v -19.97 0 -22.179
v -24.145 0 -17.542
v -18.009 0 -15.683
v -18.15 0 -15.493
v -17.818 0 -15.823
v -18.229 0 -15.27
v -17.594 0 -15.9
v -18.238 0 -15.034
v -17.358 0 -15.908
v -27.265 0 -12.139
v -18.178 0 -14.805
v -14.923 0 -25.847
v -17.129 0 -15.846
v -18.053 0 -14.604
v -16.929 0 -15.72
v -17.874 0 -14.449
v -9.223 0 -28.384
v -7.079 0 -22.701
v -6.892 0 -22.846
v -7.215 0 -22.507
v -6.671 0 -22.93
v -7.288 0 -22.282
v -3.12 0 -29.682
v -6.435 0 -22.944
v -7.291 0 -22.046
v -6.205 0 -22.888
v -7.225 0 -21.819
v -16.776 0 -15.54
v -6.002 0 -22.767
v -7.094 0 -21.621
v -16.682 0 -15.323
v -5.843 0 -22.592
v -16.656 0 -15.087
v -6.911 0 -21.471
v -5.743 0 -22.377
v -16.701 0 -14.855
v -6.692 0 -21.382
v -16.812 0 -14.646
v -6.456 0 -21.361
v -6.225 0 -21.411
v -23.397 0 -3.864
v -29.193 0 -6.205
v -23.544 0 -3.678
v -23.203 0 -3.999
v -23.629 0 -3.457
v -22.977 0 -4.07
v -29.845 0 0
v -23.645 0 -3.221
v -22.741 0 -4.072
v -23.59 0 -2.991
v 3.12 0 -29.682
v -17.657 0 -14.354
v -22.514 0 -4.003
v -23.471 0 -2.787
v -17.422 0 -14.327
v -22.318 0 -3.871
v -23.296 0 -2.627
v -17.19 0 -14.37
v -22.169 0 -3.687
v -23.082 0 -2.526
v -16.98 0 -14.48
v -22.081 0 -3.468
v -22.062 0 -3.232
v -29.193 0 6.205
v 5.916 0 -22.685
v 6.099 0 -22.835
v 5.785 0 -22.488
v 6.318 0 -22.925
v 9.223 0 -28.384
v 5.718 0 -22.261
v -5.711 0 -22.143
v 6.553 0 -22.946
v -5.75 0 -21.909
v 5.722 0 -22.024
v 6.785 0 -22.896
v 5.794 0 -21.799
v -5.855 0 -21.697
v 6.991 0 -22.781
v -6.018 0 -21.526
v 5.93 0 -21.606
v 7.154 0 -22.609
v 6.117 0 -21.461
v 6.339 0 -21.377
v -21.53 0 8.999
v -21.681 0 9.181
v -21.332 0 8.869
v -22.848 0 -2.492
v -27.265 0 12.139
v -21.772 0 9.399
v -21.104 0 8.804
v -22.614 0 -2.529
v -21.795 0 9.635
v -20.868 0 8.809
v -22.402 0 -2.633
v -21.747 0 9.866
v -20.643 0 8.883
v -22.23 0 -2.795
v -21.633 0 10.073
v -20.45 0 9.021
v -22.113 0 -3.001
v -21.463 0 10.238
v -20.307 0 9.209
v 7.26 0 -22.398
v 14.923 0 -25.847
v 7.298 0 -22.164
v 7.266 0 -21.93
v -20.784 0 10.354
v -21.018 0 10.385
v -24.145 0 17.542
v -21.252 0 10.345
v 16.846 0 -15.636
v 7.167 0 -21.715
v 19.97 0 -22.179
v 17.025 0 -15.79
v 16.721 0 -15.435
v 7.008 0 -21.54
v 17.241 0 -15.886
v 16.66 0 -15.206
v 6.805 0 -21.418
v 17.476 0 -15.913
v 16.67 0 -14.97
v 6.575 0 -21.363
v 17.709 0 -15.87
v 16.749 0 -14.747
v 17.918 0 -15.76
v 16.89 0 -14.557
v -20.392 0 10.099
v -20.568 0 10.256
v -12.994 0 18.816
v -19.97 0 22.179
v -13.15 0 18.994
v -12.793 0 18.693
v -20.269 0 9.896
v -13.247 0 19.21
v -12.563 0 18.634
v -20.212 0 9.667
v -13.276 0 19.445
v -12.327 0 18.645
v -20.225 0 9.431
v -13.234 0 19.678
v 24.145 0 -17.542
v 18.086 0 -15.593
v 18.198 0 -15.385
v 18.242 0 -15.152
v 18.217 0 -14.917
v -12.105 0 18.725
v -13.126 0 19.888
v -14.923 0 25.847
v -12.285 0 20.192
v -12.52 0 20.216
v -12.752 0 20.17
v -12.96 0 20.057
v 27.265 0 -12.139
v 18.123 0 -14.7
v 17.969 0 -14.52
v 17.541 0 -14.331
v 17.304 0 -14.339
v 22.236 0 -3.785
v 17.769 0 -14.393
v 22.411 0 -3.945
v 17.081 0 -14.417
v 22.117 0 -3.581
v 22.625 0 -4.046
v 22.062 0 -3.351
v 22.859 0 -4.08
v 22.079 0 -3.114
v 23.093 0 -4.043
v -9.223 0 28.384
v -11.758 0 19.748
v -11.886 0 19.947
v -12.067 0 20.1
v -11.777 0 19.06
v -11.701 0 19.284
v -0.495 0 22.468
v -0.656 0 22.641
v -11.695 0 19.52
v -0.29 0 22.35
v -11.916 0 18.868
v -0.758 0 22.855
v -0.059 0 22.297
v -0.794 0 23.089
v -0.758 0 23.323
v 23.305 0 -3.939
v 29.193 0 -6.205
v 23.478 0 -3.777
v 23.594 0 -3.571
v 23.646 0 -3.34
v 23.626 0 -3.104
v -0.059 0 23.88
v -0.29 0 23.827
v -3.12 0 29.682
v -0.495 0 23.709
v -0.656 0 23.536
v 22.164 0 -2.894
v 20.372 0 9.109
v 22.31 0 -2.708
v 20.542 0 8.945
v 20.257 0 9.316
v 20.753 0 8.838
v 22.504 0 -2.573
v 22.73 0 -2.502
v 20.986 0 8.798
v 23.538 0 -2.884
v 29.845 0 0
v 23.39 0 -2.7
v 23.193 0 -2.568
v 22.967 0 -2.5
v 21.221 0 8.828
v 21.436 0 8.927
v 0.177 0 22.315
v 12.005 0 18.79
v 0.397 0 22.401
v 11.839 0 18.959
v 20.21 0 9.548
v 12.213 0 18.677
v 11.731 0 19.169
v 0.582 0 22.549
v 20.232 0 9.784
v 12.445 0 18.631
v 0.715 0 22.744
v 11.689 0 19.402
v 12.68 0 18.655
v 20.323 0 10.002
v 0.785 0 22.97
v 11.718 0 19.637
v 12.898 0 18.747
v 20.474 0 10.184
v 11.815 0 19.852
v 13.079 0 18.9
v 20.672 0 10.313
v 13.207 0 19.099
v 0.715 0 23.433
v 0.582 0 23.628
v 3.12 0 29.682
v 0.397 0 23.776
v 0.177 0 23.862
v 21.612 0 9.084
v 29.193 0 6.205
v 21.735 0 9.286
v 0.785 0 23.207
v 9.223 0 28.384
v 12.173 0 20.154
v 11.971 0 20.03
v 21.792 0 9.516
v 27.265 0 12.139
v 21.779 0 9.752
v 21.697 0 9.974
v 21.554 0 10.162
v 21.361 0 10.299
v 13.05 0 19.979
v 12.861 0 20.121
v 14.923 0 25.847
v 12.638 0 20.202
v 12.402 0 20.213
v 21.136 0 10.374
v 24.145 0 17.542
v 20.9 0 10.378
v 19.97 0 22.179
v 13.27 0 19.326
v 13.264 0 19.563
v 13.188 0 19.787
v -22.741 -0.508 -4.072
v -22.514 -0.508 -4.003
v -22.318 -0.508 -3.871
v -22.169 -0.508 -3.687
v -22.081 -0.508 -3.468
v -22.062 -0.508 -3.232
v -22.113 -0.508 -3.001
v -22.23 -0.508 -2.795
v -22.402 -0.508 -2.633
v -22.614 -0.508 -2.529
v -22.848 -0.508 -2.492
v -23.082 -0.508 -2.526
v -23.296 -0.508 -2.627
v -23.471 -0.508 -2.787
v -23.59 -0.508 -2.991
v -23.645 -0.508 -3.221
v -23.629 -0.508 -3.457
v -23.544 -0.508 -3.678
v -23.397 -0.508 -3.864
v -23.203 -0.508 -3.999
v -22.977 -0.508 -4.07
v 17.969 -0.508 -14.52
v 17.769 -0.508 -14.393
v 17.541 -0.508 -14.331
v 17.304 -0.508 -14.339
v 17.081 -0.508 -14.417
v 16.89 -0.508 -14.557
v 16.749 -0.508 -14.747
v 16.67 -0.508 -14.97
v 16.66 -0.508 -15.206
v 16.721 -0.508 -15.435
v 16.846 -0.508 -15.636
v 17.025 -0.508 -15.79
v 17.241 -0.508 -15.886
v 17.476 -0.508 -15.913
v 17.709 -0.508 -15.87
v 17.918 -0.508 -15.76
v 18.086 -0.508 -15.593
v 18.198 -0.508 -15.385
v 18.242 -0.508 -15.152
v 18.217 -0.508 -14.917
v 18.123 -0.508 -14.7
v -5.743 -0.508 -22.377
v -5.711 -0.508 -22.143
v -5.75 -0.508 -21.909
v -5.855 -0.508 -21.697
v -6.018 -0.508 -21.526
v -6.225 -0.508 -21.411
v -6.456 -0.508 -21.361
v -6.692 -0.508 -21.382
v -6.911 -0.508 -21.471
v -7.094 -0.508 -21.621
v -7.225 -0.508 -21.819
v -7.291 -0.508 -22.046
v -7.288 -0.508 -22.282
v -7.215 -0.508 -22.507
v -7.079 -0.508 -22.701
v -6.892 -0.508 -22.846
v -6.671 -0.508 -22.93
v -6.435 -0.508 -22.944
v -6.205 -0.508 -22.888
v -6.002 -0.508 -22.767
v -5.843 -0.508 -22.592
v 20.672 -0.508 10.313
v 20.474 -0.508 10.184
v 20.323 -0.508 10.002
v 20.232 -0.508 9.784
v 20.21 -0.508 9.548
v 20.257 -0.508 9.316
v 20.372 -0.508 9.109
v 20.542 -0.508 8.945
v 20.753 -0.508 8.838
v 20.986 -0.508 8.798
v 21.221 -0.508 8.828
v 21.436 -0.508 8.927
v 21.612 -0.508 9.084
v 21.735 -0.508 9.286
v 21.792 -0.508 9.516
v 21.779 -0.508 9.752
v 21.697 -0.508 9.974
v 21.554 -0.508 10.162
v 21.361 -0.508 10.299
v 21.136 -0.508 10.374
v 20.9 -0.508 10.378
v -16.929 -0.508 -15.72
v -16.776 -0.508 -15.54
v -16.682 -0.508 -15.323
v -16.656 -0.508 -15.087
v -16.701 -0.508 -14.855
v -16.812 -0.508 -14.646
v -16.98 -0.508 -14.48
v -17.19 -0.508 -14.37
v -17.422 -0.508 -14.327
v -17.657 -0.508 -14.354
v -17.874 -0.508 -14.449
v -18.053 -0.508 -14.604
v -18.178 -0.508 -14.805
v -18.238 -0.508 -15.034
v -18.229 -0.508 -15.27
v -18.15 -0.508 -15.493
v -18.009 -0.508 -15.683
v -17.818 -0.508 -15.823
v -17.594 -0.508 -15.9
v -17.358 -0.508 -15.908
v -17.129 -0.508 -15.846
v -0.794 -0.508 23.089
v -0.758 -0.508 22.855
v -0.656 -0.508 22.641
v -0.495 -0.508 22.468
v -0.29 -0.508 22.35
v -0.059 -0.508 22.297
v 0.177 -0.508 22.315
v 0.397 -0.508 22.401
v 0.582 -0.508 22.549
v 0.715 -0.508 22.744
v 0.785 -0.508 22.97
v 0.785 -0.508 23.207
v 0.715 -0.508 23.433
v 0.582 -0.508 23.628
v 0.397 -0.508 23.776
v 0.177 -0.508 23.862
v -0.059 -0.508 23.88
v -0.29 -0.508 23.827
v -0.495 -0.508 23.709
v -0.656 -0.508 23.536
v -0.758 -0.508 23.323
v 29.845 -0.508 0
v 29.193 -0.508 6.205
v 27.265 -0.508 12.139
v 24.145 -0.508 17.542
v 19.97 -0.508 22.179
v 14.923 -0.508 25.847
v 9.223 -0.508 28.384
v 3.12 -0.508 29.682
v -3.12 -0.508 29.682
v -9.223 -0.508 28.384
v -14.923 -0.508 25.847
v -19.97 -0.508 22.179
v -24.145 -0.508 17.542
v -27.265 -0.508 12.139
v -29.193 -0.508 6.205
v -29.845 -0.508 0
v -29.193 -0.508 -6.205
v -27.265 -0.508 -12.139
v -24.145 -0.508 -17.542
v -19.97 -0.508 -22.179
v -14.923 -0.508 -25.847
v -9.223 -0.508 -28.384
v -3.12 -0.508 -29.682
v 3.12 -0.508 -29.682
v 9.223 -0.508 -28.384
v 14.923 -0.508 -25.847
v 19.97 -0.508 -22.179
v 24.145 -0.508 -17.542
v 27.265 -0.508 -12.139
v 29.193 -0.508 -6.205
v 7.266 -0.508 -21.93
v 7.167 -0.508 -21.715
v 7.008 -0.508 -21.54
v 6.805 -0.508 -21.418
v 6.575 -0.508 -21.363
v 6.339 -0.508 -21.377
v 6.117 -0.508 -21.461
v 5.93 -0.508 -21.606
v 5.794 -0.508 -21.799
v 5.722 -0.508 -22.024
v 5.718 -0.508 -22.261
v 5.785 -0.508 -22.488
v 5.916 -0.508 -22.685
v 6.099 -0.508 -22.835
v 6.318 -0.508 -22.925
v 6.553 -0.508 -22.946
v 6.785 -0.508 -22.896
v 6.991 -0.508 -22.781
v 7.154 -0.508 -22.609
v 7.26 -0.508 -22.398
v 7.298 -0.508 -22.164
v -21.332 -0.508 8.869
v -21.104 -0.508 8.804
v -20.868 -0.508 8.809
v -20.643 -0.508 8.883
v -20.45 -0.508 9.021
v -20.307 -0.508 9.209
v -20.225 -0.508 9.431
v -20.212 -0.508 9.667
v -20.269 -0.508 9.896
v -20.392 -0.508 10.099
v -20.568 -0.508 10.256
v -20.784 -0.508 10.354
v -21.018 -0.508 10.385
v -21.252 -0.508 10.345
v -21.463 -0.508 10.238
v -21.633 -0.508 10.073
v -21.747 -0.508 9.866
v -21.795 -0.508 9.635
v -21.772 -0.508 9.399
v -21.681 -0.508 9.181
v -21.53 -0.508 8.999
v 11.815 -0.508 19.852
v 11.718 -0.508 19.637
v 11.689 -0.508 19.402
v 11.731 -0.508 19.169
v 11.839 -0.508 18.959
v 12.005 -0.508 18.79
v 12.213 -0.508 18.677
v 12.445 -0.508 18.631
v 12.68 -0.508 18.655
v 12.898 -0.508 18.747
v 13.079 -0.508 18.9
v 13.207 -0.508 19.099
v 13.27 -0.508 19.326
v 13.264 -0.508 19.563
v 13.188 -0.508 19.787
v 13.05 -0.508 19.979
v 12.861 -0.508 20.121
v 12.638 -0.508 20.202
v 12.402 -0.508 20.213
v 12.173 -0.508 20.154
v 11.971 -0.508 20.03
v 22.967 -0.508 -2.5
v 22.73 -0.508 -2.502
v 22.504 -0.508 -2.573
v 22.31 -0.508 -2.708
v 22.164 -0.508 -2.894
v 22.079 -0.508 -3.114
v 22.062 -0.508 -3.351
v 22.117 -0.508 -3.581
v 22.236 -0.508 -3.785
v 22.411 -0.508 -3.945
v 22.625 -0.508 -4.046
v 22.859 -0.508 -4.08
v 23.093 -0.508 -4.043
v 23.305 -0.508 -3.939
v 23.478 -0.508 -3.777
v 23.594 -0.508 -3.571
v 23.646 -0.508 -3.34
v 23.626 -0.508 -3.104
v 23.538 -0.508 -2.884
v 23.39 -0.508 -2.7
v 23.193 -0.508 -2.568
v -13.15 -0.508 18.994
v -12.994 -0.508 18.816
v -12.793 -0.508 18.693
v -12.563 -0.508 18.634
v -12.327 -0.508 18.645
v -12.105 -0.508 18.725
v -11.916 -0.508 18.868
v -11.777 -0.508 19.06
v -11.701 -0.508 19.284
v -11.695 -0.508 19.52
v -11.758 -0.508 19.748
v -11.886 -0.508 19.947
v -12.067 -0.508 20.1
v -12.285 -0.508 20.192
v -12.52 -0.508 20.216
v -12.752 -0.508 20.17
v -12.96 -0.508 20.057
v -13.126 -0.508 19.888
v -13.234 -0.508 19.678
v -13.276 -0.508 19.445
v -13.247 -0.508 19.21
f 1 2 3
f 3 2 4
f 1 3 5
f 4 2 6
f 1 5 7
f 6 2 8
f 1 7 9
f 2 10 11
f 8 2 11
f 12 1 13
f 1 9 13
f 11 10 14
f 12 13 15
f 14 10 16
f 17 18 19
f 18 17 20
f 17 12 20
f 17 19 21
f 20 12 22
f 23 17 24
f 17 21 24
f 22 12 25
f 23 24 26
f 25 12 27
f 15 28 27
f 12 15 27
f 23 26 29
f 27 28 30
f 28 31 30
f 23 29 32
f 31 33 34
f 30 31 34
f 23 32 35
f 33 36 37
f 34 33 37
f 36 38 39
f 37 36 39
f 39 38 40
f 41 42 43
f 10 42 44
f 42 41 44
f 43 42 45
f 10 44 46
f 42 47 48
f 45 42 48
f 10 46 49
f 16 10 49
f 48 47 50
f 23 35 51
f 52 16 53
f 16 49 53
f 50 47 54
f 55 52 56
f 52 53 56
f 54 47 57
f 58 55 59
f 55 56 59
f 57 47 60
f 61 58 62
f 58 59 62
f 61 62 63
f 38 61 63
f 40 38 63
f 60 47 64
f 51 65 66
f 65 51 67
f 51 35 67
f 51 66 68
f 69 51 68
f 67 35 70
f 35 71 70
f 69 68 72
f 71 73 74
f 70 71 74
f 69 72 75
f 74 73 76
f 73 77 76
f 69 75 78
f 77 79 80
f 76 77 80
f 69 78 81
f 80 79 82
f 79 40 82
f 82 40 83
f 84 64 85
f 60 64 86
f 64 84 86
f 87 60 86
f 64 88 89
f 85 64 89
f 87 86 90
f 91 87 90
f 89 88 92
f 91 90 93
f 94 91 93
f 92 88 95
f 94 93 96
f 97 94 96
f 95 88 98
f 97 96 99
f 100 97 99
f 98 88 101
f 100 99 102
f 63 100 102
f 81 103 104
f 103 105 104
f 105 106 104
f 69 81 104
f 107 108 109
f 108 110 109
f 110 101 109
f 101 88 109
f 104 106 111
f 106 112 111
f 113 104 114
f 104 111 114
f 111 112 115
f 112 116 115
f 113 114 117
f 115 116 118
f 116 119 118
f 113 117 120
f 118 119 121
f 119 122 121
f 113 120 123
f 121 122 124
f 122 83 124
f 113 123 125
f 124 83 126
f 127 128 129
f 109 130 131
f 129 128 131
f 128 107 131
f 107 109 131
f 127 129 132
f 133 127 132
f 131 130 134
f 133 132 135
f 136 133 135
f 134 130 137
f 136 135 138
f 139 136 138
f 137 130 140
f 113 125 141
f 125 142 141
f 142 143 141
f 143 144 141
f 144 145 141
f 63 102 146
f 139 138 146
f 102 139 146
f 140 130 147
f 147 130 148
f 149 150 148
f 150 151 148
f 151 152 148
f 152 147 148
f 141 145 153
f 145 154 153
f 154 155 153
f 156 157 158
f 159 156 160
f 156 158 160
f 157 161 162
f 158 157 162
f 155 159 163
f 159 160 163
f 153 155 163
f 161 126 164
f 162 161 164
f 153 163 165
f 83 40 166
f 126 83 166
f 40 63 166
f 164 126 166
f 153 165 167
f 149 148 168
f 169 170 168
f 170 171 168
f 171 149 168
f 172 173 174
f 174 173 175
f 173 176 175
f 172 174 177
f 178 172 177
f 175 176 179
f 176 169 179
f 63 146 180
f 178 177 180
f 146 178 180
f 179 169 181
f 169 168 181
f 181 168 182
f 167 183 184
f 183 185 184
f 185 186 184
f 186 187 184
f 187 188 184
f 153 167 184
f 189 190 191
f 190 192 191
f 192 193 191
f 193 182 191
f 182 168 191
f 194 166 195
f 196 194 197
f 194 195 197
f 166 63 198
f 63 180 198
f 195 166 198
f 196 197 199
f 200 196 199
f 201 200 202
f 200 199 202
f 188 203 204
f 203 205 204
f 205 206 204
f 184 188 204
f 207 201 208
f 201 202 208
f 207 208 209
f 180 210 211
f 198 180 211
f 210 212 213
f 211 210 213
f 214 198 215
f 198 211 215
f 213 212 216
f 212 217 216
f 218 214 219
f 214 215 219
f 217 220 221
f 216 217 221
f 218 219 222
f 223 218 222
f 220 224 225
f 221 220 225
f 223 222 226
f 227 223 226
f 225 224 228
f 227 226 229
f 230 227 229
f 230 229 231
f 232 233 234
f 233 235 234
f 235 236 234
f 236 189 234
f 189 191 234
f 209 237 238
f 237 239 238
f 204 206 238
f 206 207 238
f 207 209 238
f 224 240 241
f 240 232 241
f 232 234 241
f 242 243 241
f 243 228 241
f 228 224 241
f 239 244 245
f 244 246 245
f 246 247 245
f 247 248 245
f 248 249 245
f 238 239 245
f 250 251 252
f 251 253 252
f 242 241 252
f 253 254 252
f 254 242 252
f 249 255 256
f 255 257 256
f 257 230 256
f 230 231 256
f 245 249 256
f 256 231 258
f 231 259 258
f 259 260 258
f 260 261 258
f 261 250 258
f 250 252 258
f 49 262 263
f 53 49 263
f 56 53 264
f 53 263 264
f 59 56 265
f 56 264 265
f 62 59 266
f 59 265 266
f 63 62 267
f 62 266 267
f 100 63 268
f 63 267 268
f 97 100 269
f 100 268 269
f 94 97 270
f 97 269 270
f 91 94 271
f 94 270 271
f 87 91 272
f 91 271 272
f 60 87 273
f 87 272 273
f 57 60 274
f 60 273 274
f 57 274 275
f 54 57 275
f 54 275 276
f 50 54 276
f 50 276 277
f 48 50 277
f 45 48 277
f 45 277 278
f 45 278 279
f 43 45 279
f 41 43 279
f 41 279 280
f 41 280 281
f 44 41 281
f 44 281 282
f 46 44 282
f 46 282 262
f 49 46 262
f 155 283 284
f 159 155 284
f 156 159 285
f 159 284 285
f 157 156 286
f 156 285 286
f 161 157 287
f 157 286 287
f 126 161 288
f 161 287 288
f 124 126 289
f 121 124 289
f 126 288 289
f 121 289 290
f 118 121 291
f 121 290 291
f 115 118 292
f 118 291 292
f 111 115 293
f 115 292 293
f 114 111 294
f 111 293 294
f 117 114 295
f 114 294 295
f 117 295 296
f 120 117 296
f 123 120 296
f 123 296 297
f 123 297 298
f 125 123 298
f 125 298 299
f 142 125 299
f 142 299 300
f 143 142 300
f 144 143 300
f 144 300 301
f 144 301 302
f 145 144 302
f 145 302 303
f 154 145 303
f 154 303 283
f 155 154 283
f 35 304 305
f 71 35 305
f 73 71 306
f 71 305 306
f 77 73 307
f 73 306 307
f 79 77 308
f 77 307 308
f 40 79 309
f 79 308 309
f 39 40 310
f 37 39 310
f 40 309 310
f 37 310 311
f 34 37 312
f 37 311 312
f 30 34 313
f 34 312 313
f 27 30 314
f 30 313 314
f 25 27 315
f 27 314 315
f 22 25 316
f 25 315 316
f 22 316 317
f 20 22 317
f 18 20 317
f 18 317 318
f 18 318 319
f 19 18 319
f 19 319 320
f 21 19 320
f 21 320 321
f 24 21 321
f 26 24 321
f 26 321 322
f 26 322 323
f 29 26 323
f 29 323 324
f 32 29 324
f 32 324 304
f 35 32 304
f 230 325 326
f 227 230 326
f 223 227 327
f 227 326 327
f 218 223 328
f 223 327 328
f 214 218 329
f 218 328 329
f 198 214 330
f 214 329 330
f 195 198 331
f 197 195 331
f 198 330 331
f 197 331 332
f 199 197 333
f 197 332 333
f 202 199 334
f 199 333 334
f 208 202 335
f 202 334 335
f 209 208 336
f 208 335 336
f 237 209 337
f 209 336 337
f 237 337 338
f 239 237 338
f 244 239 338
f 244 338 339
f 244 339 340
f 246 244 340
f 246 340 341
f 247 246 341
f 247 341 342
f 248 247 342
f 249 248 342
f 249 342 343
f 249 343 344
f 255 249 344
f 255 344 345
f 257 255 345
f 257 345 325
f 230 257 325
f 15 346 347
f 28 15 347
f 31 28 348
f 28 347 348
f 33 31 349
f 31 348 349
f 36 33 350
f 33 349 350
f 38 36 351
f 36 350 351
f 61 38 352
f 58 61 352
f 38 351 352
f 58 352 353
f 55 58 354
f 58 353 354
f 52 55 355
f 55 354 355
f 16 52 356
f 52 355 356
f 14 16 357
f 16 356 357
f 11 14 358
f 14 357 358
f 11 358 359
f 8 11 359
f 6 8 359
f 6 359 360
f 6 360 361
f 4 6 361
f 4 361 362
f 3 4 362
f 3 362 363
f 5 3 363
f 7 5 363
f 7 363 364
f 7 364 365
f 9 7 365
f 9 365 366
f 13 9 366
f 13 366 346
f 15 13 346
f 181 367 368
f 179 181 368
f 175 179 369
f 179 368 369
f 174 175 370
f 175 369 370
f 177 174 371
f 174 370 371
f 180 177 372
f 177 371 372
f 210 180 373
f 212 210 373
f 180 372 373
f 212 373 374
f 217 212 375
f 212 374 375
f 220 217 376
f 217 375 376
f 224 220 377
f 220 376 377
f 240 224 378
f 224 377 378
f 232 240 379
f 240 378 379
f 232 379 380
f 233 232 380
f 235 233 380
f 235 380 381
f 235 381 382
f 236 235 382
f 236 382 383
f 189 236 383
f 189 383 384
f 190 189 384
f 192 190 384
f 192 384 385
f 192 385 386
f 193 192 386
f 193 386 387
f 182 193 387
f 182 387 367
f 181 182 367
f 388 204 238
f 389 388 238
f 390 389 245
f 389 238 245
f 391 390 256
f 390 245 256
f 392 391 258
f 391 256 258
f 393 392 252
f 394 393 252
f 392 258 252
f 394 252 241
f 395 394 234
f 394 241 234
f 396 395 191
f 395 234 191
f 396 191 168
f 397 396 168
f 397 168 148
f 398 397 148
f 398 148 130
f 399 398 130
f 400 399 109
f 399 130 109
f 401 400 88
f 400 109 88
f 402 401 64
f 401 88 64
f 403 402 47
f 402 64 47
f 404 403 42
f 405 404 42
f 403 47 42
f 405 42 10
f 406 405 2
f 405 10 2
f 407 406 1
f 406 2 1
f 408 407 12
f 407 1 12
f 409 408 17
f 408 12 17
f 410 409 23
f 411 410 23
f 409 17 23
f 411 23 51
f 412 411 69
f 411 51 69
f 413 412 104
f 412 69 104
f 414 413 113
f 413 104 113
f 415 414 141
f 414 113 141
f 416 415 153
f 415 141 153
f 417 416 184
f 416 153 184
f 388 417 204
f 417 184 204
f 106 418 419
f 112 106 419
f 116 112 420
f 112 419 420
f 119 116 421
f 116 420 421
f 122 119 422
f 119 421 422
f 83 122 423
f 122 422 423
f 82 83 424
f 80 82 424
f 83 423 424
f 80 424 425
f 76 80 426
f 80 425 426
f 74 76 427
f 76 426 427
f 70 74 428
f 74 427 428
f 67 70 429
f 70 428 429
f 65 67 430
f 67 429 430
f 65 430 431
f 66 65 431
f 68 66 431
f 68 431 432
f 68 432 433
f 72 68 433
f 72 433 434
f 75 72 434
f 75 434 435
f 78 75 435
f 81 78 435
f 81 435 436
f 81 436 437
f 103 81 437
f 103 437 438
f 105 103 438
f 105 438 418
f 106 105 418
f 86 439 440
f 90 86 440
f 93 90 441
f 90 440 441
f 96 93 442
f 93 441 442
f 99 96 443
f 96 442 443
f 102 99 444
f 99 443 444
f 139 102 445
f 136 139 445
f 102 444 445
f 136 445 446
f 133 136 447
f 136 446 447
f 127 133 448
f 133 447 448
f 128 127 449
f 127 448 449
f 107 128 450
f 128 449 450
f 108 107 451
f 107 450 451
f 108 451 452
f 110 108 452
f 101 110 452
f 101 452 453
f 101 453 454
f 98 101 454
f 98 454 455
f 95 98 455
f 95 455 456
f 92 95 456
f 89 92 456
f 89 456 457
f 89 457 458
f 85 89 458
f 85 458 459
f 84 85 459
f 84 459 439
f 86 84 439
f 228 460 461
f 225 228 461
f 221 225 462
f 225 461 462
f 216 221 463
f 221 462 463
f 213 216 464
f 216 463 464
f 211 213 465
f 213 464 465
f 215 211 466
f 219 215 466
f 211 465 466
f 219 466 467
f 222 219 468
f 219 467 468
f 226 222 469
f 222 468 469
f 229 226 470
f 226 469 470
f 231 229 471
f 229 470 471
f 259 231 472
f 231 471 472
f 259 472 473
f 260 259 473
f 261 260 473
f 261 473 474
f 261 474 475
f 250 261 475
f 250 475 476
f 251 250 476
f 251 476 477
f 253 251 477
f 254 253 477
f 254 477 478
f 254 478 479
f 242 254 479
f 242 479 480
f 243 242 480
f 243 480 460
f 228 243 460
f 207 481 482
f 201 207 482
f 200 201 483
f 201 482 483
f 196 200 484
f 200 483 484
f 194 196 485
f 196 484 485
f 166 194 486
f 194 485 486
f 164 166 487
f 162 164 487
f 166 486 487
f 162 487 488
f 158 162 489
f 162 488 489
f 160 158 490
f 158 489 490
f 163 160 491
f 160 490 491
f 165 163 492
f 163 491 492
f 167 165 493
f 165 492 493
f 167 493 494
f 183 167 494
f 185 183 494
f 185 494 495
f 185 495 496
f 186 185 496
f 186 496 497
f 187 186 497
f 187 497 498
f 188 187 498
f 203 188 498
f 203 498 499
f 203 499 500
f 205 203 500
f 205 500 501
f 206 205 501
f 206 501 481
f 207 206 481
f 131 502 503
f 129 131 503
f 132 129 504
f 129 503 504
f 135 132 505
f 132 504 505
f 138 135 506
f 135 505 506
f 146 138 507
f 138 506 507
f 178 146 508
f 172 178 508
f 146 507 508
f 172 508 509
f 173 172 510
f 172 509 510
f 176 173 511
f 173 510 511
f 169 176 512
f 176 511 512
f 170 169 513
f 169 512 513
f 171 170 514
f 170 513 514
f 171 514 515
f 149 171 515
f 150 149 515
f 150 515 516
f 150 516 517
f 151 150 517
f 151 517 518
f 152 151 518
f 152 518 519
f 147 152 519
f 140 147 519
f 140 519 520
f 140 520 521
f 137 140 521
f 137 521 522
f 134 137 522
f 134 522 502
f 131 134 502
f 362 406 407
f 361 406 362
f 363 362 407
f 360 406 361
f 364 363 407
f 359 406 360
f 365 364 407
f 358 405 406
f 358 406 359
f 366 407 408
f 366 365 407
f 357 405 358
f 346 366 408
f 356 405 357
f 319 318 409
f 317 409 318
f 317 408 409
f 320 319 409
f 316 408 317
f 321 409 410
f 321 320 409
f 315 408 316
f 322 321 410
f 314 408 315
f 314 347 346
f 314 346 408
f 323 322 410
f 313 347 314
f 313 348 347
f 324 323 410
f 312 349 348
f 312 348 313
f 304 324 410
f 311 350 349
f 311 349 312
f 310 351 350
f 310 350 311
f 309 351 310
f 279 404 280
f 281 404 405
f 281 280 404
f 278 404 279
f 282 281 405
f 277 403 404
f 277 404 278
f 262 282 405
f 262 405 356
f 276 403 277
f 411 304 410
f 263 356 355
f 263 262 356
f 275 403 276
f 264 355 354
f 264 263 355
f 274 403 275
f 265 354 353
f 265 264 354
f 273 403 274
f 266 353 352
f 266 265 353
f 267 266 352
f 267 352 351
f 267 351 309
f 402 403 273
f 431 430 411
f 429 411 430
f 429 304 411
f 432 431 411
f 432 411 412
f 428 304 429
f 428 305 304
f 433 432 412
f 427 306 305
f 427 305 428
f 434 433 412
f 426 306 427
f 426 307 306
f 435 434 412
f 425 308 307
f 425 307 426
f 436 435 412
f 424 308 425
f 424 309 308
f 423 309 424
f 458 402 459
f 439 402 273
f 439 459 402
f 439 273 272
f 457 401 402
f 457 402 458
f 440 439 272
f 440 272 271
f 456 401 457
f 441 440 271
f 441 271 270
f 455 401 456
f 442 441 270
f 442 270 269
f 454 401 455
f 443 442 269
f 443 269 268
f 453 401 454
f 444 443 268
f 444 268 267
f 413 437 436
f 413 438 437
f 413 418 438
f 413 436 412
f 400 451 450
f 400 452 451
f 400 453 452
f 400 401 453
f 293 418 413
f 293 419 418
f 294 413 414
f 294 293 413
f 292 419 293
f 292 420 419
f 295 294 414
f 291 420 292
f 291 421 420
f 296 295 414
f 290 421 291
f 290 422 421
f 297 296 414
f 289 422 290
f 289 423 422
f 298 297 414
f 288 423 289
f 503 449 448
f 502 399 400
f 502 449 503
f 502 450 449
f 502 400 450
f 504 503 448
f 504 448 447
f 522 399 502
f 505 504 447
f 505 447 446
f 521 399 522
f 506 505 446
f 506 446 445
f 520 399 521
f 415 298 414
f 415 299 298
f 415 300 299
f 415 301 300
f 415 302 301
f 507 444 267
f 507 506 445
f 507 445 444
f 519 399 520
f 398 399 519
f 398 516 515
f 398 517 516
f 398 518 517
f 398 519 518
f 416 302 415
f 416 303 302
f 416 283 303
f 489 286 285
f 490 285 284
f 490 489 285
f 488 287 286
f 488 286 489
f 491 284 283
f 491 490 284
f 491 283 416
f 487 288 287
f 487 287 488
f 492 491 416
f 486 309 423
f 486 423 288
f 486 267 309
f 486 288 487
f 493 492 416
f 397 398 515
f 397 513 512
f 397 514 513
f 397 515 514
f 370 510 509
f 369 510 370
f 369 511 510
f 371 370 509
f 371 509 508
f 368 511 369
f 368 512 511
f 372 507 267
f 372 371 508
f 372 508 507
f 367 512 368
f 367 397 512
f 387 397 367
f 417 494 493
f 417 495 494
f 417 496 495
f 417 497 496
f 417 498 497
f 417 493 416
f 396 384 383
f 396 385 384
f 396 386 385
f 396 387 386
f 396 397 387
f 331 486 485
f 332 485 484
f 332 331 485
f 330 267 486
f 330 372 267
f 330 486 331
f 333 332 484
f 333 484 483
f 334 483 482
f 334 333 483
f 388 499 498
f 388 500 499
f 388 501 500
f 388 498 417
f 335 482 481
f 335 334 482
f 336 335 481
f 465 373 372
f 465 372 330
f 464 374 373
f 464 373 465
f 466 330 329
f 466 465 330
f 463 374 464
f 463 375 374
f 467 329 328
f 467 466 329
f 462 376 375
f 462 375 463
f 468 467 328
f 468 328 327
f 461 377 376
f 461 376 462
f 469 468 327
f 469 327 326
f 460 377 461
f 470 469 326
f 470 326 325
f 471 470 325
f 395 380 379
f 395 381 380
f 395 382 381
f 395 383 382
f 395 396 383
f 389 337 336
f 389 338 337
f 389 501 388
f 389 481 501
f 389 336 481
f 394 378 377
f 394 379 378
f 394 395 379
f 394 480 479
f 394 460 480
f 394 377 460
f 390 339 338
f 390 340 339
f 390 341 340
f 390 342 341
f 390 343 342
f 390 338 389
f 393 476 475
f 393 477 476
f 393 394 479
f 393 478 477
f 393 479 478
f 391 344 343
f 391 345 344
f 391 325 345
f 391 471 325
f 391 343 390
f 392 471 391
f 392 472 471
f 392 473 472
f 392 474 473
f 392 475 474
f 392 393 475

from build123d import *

# Parameters (mm, degrees)
F0_R            = 29.845
F1_DEPTH        = 0.508
F2_D            = 1.5875
F2_COPIES_COUNT = 11


# Not quite as in the source:
# - a pattern or mirror of a feature is missing from the dataset's text; its kind, count and spacing are read off the source's solid


with BuildPart() as f1:
    # F0 (on Front) → F1 (new body)
    with BuildSketch(Plane.XZ):
        Circle(F0_R)
    extrude(amount=F1_DEPTH)

    # F2 (through all)
    with Locations(Plane(origin=(0, 0, 0), x_dir=(1, 0, 0), z_dir=(0, 1, 0))):
        with Locations((0, -23.0886)):
            f2 = Hole(F2_D / 2)

    # F2_copies: F2 ×11 about axis
    f2_copies_axis = Axis((0, 0, 0), (0, 1, 0))
    for i in range(1, F2_COPIES_COUNT):
        add(f2.rotate(f2_copies_axis, i * 360 / F2_COPIES_COUNT), mode=Mode.SUBTRACT)


solid = f1.part
